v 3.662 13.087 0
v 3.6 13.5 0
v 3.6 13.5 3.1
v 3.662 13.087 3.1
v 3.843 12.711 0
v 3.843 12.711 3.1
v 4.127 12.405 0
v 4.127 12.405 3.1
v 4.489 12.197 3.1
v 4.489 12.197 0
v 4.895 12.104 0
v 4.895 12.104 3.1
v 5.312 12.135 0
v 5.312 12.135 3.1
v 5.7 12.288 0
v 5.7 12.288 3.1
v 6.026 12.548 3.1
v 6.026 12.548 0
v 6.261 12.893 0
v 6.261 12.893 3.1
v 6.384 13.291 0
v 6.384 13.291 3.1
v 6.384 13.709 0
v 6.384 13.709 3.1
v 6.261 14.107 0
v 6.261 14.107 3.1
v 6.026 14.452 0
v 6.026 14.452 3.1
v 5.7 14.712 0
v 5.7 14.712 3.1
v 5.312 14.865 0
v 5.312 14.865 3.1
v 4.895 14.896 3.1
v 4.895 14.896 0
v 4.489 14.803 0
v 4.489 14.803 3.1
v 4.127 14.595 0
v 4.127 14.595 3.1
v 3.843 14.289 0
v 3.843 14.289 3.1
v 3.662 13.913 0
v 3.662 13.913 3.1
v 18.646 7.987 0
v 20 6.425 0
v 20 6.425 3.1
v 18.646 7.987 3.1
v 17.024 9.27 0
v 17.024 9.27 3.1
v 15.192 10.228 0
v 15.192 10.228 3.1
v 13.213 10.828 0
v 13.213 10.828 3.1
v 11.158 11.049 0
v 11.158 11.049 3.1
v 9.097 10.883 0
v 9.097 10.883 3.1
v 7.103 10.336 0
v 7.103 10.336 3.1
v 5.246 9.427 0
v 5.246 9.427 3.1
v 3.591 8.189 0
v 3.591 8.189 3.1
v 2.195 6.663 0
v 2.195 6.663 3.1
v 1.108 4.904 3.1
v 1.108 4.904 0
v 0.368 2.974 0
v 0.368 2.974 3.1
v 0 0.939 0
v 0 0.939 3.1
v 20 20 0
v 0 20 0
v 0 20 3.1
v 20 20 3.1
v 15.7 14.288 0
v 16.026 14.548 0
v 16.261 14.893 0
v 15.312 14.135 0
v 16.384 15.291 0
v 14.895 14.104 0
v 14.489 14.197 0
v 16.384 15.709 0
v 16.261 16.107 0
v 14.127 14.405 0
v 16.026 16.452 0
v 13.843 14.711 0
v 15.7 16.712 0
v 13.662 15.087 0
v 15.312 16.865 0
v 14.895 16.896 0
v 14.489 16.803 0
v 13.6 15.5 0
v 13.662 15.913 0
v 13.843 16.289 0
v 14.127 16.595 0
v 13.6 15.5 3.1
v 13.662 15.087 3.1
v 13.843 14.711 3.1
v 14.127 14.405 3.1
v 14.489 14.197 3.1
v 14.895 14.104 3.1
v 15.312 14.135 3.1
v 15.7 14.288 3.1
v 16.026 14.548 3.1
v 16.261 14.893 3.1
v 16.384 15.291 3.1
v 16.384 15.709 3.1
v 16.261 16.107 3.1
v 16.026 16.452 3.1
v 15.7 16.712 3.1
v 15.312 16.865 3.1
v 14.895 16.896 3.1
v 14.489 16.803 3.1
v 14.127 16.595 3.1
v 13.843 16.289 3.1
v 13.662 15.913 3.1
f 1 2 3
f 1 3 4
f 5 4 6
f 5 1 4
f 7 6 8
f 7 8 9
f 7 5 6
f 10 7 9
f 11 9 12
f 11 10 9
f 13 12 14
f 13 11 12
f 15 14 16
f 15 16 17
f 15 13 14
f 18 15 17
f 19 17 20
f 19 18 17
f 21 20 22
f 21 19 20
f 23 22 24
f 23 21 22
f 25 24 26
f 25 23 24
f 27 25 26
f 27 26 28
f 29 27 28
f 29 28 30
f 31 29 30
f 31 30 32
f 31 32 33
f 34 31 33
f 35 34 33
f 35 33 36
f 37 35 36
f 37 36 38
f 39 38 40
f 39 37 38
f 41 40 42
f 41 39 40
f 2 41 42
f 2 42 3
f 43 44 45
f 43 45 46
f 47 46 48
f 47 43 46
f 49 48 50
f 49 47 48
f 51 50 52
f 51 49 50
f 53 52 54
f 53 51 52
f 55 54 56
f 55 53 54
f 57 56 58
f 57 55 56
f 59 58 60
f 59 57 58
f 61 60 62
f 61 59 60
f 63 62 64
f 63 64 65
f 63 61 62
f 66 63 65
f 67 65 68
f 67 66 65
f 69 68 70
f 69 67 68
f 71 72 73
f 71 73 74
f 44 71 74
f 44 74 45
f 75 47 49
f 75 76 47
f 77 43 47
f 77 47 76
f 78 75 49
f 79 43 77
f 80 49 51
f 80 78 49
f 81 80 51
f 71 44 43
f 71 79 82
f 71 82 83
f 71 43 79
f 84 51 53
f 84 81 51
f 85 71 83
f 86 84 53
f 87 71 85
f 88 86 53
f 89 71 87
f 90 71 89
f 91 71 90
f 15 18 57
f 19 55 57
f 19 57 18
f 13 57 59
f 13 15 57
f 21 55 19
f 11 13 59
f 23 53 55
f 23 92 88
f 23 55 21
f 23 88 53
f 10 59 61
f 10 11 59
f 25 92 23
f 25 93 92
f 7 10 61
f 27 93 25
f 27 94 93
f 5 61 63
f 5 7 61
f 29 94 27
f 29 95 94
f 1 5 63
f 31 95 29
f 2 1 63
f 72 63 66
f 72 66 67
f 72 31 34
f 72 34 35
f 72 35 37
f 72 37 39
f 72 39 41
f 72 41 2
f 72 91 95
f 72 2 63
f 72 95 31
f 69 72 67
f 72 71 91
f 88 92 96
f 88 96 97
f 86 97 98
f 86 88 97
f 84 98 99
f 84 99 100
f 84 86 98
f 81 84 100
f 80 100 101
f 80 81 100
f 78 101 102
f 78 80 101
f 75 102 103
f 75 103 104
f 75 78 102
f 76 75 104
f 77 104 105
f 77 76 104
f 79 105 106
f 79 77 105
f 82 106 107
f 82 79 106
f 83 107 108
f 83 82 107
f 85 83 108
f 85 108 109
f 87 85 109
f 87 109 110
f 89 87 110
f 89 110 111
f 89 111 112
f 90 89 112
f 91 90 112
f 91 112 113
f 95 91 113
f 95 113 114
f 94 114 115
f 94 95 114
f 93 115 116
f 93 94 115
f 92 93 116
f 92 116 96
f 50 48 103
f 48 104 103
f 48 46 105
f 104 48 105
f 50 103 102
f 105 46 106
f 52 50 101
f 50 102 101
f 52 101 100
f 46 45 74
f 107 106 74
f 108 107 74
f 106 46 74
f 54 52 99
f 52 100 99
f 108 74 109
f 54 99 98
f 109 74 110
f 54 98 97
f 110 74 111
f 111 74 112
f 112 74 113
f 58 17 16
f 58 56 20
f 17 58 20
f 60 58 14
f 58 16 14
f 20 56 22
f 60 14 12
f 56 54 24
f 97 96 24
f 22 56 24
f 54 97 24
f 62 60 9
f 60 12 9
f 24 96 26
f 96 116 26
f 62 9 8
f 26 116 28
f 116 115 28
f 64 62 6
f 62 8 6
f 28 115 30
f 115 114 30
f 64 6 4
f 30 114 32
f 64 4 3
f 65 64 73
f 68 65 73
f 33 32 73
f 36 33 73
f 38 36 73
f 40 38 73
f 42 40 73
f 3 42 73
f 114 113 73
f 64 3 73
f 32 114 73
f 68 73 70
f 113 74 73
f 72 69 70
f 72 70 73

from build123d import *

# Parameters (mm, degrees)
SKETCH1_R           = 1.4
BOSS_EXTRUDE1_DEPTH = 3.1


with BuildPart() as part:
    # Sketch1 → Boss-Extrude1 (new body)
    with BuildSketch(Plane.XY):
        with BuildLine():
            Line((0, 0.939361485), (0, 20))
            Line((0, 20), (20, 20))
            Line((20, 20), (20, 6.425138131))
            ThreePointArc((20, 6.425138131), (8.087067166, 10.656404818), (0, 0.939361485))
        make_face()
        with Locations(Location((5, 13.5, 0), (0, 0, 180))):
            Circle(SKETCH1_R, mode=Mode.SUBTRACT)
        with Locations(Location((15, 15.5, 0), (0, 0, 180))):
            Circle(SKETCH1_R, mode=Mode.SUBTRACT)
    extrude(amount=BOSS_EXTRUDE1_DEPTH)


solid = part.part
